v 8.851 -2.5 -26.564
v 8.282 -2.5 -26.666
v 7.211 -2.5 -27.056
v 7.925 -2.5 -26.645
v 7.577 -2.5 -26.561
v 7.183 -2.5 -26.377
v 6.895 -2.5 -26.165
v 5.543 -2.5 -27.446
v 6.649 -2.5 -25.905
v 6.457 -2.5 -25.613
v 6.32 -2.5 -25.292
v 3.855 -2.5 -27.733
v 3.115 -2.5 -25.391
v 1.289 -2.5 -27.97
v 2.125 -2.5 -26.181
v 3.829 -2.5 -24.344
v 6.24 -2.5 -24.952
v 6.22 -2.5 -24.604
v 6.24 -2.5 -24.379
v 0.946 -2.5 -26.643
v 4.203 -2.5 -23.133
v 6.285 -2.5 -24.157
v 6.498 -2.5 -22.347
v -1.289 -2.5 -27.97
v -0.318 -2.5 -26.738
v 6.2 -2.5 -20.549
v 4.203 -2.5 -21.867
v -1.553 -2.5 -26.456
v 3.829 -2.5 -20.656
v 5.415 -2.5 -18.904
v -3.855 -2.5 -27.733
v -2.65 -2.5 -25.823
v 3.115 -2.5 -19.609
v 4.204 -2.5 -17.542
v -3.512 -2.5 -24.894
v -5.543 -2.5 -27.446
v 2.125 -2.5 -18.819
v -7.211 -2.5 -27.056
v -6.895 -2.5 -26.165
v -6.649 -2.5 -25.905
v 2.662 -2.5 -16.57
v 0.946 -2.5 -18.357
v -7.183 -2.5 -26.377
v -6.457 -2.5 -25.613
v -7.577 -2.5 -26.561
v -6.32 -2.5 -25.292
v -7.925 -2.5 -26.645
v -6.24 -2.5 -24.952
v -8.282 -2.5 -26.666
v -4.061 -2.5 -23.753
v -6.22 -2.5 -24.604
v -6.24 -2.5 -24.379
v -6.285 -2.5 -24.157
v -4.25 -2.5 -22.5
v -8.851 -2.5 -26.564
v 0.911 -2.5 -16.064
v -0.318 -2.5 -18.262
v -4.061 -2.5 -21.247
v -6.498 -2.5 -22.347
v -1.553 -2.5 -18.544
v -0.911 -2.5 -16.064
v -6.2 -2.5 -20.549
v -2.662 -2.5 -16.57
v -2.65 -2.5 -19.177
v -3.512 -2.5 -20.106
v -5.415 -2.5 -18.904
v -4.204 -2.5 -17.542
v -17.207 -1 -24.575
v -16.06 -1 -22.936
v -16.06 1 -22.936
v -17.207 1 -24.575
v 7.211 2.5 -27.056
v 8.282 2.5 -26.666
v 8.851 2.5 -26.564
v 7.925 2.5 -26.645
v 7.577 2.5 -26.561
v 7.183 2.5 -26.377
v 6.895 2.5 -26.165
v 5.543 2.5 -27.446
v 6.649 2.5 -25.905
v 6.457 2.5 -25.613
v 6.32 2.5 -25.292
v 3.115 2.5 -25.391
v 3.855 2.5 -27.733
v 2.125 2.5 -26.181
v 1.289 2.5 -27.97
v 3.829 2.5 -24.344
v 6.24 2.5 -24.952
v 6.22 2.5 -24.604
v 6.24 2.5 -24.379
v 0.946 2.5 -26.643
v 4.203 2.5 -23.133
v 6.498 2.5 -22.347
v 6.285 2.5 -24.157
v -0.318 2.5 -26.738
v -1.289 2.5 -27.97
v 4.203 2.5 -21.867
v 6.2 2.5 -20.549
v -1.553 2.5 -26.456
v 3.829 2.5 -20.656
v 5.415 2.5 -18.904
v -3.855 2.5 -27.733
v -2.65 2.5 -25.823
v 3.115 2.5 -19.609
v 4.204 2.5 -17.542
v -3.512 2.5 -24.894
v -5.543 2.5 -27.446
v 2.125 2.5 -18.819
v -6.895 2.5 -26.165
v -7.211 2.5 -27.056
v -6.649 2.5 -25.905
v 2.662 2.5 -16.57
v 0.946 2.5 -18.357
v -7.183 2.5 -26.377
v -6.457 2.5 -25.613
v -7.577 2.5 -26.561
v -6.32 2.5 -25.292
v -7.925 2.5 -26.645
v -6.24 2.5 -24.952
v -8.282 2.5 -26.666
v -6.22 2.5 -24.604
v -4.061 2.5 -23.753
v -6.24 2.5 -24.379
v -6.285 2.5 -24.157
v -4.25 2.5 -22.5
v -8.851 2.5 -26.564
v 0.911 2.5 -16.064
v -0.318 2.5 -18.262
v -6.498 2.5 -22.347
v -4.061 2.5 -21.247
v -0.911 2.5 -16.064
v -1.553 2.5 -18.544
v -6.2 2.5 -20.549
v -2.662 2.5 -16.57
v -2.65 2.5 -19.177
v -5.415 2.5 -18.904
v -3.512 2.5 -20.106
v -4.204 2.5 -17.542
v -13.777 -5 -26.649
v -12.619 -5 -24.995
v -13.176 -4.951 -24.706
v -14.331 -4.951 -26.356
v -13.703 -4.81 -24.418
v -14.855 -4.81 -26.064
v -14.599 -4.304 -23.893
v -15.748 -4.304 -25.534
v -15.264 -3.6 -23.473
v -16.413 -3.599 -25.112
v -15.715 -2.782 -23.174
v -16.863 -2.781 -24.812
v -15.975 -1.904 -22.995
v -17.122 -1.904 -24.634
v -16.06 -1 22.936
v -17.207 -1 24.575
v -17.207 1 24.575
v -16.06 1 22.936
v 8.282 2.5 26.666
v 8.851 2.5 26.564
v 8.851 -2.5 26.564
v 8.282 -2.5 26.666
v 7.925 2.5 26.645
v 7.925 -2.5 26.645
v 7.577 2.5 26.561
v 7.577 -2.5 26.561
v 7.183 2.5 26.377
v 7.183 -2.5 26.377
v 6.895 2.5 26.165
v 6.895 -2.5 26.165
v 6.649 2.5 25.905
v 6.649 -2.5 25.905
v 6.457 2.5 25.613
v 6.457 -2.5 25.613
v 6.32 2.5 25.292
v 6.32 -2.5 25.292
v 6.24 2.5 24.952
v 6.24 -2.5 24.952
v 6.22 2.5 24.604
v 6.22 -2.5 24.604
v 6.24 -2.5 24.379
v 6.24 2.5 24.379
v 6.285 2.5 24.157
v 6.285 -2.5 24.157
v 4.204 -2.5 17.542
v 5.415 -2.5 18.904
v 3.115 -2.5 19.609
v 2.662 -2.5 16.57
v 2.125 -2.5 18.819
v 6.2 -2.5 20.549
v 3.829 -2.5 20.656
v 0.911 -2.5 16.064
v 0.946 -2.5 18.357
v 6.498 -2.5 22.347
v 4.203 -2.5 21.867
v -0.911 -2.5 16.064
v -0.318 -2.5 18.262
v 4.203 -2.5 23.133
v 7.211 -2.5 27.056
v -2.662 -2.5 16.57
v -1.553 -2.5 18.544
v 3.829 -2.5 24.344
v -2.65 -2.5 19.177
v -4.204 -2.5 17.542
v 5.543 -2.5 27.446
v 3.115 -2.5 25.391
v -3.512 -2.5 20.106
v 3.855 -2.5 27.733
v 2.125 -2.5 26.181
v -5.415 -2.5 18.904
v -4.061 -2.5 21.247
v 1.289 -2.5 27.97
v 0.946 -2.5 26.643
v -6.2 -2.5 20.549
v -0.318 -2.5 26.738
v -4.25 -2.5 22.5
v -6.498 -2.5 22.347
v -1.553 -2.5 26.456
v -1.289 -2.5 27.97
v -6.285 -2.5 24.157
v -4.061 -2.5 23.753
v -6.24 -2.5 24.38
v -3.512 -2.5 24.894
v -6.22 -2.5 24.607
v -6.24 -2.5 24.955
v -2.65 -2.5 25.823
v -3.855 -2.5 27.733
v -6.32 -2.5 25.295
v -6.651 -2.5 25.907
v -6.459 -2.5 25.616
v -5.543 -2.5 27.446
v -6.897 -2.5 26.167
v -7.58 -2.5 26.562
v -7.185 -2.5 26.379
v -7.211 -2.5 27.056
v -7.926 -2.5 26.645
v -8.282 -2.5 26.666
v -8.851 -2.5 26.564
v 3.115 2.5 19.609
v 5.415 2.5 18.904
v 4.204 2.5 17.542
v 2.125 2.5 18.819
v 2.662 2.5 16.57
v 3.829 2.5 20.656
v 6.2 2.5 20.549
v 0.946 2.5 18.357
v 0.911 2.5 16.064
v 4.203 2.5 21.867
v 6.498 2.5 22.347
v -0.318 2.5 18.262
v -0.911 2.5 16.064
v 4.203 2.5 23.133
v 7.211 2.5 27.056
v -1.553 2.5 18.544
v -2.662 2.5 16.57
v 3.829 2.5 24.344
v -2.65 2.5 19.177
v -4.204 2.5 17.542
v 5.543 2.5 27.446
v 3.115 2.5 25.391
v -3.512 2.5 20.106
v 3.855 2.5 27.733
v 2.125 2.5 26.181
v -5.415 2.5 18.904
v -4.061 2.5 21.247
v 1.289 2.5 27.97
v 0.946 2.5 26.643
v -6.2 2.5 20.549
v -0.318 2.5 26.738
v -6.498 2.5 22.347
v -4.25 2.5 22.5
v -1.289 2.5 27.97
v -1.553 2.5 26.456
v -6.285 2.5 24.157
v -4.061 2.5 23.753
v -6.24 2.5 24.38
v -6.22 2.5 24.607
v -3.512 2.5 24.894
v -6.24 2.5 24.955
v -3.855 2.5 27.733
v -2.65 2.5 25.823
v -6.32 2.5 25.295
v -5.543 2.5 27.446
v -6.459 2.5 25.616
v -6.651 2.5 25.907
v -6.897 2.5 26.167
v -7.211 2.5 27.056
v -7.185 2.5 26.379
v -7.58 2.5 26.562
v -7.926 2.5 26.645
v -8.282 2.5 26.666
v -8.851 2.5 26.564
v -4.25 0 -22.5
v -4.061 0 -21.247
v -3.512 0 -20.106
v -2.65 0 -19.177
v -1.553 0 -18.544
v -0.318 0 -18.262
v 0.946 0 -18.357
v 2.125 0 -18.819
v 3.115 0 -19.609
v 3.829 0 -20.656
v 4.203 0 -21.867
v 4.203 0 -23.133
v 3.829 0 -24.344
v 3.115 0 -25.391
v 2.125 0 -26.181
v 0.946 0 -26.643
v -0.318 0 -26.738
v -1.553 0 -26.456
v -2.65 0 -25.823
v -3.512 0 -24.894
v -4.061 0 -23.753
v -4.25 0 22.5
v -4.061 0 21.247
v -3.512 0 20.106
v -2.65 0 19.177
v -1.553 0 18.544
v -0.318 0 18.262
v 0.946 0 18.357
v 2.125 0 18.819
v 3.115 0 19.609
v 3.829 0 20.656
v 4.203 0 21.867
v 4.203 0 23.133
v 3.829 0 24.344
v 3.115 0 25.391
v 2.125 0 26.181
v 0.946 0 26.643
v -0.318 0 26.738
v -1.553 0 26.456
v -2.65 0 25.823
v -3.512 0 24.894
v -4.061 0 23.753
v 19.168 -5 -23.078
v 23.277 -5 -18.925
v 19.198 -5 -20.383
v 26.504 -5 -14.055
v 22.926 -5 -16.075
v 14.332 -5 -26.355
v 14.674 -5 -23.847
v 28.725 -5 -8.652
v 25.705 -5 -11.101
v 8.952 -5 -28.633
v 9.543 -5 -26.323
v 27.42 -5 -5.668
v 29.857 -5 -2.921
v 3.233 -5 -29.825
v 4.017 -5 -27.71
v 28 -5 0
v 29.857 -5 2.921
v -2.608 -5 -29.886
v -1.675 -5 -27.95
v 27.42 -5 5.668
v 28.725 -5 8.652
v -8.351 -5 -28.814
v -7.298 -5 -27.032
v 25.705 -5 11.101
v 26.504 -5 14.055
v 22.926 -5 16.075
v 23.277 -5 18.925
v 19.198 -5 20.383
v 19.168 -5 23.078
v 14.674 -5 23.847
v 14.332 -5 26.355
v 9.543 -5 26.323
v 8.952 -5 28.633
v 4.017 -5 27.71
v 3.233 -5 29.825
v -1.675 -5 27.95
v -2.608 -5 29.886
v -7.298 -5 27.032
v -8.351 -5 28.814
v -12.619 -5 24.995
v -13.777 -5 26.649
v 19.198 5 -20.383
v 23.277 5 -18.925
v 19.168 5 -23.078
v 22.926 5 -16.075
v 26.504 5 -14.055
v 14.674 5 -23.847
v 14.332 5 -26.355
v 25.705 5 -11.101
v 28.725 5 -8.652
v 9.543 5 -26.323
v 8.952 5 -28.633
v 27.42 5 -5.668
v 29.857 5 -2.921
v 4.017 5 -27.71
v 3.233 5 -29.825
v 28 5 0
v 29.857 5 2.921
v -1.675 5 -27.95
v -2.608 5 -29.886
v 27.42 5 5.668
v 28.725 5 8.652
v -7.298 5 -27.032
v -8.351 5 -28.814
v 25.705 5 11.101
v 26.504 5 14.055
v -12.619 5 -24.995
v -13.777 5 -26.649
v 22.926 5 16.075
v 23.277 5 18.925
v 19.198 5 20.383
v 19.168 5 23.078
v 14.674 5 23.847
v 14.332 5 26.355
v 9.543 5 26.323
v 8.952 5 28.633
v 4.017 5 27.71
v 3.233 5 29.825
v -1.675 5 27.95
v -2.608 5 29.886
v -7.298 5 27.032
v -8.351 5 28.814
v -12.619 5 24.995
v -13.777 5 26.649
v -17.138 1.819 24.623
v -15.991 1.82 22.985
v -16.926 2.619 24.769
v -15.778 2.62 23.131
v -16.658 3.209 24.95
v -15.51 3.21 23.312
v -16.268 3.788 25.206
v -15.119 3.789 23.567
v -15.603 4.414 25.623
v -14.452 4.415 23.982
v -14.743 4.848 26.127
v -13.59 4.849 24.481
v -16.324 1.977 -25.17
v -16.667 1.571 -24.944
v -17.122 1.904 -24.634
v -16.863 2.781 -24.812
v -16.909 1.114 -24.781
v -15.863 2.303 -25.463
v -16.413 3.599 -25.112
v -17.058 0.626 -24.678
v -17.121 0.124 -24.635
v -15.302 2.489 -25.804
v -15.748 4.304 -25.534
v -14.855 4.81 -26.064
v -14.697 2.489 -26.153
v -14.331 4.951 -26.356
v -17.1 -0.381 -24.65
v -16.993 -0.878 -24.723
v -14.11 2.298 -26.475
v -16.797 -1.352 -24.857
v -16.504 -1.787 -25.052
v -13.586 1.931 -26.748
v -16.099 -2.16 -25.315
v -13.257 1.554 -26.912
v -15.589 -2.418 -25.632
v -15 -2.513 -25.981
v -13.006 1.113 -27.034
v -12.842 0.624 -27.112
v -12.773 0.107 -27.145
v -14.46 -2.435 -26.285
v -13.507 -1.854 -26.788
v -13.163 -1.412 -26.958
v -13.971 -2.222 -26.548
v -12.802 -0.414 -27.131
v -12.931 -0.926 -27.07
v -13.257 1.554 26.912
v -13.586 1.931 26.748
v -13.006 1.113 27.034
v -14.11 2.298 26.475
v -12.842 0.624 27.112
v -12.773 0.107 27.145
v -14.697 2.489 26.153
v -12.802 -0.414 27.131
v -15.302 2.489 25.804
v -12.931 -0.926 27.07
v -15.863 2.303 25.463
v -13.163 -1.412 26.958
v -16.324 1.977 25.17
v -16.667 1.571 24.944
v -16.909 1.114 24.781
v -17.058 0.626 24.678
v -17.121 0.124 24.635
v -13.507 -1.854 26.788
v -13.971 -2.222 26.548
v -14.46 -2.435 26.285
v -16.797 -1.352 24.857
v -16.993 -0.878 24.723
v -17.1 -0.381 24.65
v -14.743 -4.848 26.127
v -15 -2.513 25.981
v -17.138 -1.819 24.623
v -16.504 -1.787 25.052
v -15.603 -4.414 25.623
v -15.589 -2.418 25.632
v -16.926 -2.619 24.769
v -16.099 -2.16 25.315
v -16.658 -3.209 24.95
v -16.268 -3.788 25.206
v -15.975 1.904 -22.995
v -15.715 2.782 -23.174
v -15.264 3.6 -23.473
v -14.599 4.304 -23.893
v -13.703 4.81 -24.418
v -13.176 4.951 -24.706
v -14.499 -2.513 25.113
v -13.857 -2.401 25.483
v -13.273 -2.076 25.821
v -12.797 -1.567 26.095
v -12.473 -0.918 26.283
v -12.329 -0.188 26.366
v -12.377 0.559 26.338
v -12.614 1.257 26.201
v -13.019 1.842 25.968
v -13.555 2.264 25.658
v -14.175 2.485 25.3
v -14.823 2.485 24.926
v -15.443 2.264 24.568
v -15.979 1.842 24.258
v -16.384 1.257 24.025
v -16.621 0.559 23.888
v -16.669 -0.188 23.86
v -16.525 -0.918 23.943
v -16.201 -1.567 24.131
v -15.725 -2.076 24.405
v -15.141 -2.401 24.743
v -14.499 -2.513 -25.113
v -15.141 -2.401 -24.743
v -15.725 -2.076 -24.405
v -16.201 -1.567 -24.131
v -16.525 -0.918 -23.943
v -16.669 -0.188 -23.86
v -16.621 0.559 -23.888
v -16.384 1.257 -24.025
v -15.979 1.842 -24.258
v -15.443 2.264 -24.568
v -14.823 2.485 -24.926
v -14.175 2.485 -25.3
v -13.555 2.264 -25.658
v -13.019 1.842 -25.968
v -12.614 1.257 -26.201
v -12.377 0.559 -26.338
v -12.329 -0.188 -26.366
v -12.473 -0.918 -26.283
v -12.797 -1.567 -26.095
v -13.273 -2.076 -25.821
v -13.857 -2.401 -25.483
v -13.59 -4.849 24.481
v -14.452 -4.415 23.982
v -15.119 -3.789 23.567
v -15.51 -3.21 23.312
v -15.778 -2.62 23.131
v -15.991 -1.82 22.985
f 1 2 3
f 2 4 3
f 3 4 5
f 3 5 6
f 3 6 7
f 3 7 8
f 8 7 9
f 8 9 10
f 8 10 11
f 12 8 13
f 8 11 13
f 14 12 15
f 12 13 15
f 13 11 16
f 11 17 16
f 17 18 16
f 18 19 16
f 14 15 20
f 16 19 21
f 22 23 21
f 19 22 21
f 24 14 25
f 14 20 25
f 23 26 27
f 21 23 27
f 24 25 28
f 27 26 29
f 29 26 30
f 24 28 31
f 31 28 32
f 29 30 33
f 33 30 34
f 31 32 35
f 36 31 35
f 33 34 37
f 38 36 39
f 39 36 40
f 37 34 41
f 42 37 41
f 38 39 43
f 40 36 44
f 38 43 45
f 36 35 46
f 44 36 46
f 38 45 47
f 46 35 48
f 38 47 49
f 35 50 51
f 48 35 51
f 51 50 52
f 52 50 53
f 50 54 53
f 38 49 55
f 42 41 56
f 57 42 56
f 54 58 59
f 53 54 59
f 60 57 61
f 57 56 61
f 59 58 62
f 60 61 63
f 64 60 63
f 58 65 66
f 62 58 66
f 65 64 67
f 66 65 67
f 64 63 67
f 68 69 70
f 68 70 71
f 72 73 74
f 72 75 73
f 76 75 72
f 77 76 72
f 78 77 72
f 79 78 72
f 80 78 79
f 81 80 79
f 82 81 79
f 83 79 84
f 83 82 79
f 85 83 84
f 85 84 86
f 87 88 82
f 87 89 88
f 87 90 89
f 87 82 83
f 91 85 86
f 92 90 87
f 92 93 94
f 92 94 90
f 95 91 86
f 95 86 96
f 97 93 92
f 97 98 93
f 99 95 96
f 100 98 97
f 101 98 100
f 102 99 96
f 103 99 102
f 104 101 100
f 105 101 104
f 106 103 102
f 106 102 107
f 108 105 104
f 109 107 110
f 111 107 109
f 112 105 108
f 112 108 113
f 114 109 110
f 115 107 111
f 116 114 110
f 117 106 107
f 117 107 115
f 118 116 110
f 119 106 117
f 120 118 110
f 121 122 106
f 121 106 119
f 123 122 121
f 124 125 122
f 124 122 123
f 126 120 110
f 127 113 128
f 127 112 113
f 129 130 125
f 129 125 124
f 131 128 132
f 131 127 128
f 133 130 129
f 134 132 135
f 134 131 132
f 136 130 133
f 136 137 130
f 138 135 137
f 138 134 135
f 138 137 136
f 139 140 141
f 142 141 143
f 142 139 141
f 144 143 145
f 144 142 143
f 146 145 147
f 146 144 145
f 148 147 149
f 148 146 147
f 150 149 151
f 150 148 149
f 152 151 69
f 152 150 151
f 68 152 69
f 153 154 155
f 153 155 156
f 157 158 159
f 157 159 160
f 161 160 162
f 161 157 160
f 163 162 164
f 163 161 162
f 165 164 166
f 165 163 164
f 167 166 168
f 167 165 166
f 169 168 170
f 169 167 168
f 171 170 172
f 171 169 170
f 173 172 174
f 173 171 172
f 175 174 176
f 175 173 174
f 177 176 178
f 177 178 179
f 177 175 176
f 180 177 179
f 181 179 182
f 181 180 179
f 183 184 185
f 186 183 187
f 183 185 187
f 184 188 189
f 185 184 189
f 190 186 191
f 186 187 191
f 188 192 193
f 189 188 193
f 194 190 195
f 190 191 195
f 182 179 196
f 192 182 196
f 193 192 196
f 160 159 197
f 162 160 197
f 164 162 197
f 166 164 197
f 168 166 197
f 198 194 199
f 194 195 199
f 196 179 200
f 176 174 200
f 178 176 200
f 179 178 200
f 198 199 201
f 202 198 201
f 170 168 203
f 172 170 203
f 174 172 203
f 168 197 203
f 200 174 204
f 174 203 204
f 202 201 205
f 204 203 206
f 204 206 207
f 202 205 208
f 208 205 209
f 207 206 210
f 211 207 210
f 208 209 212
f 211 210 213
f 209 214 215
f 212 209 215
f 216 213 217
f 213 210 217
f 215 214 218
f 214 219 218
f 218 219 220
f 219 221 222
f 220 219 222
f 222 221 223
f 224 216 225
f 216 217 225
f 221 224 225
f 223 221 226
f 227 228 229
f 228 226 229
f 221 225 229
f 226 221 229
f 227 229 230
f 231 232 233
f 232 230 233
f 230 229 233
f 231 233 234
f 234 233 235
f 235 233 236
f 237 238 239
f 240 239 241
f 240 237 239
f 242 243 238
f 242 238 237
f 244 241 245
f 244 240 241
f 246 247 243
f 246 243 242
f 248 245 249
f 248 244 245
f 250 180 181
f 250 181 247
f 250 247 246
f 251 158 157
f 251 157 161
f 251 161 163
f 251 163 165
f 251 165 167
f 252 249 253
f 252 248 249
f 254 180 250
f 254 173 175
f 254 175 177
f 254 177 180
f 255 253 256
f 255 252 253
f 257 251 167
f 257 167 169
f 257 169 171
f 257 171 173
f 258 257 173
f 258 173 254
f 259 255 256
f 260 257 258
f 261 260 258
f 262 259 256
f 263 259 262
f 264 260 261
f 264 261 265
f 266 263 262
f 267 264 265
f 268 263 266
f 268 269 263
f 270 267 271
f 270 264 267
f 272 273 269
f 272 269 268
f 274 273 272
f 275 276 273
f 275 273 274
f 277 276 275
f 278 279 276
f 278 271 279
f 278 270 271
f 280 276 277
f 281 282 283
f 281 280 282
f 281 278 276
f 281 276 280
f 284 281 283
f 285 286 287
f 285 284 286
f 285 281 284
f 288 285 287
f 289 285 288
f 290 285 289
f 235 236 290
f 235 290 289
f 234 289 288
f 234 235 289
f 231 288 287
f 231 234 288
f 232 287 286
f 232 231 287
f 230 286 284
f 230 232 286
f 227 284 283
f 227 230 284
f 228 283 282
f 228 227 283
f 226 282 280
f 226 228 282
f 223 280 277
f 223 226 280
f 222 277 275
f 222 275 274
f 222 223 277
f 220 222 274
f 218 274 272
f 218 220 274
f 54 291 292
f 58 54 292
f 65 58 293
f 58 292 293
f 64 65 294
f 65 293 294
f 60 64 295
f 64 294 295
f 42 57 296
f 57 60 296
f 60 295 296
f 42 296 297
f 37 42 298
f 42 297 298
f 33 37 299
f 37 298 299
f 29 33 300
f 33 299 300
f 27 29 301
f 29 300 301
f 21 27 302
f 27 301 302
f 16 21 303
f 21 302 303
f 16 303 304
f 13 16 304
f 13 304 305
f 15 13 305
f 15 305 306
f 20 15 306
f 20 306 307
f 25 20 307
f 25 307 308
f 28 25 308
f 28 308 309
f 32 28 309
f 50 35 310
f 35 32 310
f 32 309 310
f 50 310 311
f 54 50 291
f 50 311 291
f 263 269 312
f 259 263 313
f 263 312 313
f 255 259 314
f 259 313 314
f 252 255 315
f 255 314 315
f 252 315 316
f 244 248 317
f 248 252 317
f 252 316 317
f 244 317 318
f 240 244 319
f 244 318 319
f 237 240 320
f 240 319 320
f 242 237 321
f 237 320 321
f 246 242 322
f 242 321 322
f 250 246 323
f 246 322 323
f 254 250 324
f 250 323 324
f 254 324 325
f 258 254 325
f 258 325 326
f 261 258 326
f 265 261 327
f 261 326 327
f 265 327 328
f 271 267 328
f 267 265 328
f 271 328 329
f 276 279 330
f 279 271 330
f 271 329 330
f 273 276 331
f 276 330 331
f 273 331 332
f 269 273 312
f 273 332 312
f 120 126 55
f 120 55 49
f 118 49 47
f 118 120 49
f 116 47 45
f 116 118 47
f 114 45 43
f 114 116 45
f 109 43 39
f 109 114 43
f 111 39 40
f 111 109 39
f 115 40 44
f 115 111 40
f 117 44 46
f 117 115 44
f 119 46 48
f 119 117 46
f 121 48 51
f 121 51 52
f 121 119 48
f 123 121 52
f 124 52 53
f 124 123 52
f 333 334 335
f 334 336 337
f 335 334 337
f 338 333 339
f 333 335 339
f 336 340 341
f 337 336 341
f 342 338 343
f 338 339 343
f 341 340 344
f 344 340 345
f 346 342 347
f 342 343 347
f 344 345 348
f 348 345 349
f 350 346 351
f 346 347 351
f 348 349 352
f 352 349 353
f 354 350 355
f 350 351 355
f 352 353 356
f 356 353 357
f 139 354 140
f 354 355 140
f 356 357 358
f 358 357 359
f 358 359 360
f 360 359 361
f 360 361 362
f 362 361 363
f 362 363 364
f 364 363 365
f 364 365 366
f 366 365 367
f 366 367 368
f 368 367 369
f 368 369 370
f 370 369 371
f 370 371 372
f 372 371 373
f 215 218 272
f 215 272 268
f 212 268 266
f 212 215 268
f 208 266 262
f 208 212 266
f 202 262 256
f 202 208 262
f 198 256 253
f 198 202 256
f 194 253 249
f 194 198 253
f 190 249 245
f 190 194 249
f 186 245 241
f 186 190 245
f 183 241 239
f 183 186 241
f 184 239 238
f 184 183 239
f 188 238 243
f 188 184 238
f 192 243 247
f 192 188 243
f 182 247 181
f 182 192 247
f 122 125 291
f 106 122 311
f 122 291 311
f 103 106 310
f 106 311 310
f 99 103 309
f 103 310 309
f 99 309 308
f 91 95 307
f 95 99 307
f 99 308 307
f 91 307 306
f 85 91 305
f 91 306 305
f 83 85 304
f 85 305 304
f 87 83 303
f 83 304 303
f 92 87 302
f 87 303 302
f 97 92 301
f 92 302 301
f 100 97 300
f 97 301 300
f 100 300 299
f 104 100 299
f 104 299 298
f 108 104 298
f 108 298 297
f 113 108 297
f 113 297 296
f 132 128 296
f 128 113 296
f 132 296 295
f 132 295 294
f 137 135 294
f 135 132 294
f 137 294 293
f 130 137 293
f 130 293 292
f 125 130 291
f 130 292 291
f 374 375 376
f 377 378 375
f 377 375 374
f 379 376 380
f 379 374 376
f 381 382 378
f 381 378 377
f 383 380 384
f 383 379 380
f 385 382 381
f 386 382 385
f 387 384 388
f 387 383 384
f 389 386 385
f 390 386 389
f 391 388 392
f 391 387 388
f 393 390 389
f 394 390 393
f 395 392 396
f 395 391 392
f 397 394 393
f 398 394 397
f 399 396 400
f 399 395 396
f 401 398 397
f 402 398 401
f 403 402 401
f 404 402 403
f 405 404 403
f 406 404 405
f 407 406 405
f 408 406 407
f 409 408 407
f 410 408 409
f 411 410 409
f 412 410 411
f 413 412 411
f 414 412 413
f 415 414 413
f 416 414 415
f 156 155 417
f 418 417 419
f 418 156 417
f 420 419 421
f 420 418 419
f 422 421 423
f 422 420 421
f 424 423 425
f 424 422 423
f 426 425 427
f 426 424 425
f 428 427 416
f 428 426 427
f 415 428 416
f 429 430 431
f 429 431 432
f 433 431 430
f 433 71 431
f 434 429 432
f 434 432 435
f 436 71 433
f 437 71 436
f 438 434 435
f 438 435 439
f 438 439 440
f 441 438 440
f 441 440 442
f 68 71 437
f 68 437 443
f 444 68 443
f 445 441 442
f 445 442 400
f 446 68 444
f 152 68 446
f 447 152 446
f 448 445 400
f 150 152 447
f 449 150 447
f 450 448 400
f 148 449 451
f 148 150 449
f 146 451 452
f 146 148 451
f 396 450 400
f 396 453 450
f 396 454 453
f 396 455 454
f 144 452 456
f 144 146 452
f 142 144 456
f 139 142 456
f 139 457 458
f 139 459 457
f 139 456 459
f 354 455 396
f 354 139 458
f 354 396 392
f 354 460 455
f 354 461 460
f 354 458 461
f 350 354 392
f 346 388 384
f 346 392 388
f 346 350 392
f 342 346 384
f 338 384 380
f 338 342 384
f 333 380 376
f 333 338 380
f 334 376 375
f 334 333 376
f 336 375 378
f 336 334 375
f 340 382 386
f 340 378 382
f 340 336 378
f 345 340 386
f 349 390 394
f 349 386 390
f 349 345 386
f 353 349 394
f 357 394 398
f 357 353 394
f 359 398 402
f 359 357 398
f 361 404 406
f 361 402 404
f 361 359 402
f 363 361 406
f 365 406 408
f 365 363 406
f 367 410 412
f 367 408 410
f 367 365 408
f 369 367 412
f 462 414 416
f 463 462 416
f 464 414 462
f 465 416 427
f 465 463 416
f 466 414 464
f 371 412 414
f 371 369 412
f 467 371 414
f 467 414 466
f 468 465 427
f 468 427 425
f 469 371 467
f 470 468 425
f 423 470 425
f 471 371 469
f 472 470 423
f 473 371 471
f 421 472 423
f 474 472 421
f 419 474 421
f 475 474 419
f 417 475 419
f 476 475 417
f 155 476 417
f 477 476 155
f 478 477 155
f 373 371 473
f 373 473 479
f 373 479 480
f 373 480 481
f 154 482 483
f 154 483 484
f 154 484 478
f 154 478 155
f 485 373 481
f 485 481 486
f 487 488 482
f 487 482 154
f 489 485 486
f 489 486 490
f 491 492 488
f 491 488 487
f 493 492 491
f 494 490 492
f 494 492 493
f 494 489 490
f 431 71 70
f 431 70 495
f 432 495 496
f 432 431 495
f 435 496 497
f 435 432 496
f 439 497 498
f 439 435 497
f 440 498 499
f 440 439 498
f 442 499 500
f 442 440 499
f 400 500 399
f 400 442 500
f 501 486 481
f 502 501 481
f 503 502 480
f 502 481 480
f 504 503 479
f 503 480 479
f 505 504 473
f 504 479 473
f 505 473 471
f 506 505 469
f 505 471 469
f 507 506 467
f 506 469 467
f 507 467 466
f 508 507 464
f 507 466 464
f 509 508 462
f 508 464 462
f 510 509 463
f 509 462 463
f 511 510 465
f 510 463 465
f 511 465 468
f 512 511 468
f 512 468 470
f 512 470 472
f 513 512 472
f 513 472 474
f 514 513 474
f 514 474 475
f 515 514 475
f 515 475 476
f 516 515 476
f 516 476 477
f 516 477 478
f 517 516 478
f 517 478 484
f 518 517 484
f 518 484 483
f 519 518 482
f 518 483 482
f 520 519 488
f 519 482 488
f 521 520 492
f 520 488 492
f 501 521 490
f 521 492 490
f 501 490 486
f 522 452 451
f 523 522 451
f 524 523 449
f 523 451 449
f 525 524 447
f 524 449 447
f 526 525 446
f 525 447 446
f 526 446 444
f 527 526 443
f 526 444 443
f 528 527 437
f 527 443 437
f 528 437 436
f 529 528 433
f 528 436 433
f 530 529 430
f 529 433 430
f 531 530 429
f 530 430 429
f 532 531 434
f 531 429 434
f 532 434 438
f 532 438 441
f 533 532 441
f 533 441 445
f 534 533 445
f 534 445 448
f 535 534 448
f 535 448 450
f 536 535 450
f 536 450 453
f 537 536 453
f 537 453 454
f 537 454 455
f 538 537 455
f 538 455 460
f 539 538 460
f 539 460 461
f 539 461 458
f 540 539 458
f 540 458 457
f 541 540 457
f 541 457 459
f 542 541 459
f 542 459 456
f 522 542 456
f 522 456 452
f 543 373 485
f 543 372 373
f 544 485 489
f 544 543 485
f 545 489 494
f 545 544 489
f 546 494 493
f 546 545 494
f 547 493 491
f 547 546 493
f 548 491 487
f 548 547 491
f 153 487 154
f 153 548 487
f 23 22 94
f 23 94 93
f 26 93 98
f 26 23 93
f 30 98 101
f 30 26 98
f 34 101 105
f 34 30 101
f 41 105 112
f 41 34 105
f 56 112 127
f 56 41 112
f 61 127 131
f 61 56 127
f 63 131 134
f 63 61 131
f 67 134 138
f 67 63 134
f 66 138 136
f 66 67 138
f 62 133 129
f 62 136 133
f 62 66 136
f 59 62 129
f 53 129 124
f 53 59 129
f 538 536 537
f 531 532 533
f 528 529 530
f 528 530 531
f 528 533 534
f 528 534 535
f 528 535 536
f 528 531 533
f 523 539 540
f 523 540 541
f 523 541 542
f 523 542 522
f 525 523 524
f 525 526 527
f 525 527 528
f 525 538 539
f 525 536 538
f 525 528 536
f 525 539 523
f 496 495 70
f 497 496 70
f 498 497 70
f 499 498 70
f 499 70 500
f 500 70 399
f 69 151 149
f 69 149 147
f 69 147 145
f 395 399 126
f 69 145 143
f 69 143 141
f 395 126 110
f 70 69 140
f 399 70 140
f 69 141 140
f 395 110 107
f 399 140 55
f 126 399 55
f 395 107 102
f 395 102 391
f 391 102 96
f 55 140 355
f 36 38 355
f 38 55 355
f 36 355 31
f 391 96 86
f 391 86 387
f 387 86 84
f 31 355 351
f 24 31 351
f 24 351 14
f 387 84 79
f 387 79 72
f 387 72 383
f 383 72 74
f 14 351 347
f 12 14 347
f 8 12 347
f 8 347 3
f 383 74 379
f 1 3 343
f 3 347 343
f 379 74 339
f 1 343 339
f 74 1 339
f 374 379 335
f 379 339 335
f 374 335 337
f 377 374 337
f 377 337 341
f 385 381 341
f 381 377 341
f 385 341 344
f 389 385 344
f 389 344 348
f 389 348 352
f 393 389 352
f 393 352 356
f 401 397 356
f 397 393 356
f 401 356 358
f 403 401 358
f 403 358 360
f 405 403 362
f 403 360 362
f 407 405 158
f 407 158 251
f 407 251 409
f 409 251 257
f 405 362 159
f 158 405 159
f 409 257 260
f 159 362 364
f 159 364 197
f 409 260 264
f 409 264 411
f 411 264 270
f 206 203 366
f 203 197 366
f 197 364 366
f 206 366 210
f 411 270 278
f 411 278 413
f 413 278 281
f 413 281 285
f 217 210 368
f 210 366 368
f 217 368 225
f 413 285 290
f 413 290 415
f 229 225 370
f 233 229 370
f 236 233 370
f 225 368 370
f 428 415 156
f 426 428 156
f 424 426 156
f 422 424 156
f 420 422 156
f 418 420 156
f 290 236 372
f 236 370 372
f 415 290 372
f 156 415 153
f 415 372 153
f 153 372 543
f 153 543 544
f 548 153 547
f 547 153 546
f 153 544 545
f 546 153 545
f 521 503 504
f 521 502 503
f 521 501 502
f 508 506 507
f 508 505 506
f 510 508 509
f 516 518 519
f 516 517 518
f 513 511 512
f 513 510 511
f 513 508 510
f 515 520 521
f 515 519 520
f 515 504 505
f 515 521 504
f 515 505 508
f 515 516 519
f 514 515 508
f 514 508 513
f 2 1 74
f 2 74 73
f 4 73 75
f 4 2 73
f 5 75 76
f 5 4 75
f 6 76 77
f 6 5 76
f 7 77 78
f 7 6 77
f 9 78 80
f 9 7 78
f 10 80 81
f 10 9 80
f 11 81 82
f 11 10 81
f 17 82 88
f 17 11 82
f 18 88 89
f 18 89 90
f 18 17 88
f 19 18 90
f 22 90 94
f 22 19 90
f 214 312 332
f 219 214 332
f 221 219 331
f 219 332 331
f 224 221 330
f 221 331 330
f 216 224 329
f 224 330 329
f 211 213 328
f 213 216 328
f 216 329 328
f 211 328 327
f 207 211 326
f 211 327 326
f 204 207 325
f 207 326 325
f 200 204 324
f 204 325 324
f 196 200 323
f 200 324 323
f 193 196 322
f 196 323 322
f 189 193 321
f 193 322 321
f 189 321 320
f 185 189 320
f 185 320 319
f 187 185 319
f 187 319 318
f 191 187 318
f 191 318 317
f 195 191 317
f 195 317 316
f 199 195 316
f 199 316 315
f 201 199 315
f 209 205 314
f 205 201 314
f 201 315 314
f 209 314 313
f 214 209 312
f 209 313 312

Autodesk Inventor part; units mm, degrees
ref_plane "YZ Plane" through (0, 0, 0) normal (1, 0, 0) x (0, 1, 0)
ref_plane "XZ Plane" through (0, 0, 0) normal (0, 1, 0) x (-1, 0, 0)
ref_plane "XY Plane" through (0, 0, 0) normal (0, 0, 1) x (1, 0, 0)
sketch "Skizze1" plane through (0, 0, 0) normal (0, 1, 0) x (-1, 0, 0)
  circle A0 centre (0, 0) radius 28
  circle A1 centre (0, 0) radius 30
  dimension "d0" = 56
  dimension "d1" = 60
extrude "Extrusion1" add sketch "Skizze1" along normal mid plane 10
sketch "Skizze2" plane through (0, 0, 0) normal (0, 1, 0) x (-1, 0, 0)
  circle A0 centre (0, 22.5) radius 4.25
  circle A1 centre (0, -22.5) radius 4.25
  line L0 (44.9262, 0) -> (-43.1306, 0) construction
  circle A2 centre (0, -22.5) radius 6.5
  circle A3 centre (0, 22.5) radius 6.5
  line L1 (0, 38.6377) -> (0, -60.2779) construction
  line L2 (3, 29.5) -> (-3, 29.5)
  line L3 (-3, 29.5) -> (-3, -29.5)
  line L4 (-3, -29.5) -> (3, -29.5)
  line L5 (3, -29.5) -> (3, 29.5)
  point P0 (0, 0)
  point P1 (-3, 28.2663)
  point P2 (3, 28.2663)
  point P3 (-3, -28.2663)
  point P4 (3, -28.2663)
  dimension "d4" = 45
  dimension "d5" = 8.5
  dimension "d6" = 8.5
  dimension "d7" = 13
  dimension "d8" = 13
  dimension "d9" = 6
  dimension "d21" = 59
extrude "Extrusion2" add sketch "Skizze2" along normal mid plane 5 contours A0 L5 A3 | A0 L3 A3 L5 | L5 A3 L3 A0 | A0 L3 A3 | A3 L3 L2 L5 | L5 A1 L3 A2 | A2 L5 A1 | L3 A1 A2 | L3 A1 L5 A2 | A2 L5 L4 L3
sketch "Skizze3" plane through (0, 0, 0) normal (0, 1, 0) x (-1, 0, 0)
  line L0 (-37.328, 53.3099) -> (47.5678, -67.9338) construction
  line L1 (48.5469, 69.3321) -> (-29.5635, -42.2211) construction
  line L2 (0, 56.0595) -> (0, -79.5026) construction
  circle A0 centre (0, 0) radius 30
  circle A1 centre (0, 0) radius 28
  line L3 (19.8236, 28.311) -> (13.732, 19.6114)
  line L4 (14.4871, -20.6897) -> (22.3283, -31.8882)
  point P0 (16.0601, -22.9363)
  point P1 (17.2073, -24.5746)
  point P2 (17.2073, 24.5746)
  point P3 (16.0601, 22.9363)
  dimension "d12" = 110
  dimension "d13" = 35
  dimension "d19" = 56
  dimension "d20" = 60
extrude "Extrusion3" cut sketch "Skizze3" along normal mid plane 10 contours A0 L4 A1 L3 picked at (29.0468, 2.3769)
sketch "Skizze4" plane through (0, 0, 0) normal (0, 1, 0) x (-1, 0, 0)
  line L0 (-8.0451, 13.9345) -> (38.1422, -66.0642) construction
  line L1 (17.2073, -24.5746) -> (16.0601, -22.9363) construction
  line L2 (0, 9.2259) -> (0, -51.7672) construction
  arc A0 (17.2073, 24.5746) -> (17.2073, -24.5746) centre (0, 0) ccw projected
  point P0 (16.6337, -23.7554)
  point P1 (15, -25.9808)
  point P2 (15, -25.9808)
  point P3 (19.2393, -22.9285)
  dimension "d16" = 30
ref_plane "Arbeitsebene3" through (-15.5, 0, -26.8468) normal (-0.4226, 0, -0.9063) x (0, -1, 0)
sketch "Skizze5" plane through (-15.5, 0, -26.8468) normal (-0.4226, 0, -0.9063) x (0, -1, 0)
  point P0 (0, -2.7018)
ref_plane "Arbeitsebene4" through (-15, 0, -25.9808) normal (-0.5, 0, -0.866) x (0, -1, 0)
sketch "Skizze6" plane through (-15, 0, -25.9808) normal (-0.5, 0, -0.866) x (0, -1, 0)
  circle A0 centre (0, 0) radius 2.5131
  point P0 (0, 0)
extrude "Extrusion5" cut sketch "Skizze6" against normal blind 1
mirror "Spiegeln2" about plane through (0, 0, 0) normal (0, 0, 1) of "Extrusion5"
fillet "Rundung1" radius 4 4 edges at (-16.6337, -5, -23.7554) (-16.6337, 5, -23.7554) (-16.6337, 5, 23.7554) (-16.6337, -5, 23.7554)
fillet "Rundung2" radius 2 4 edges at (3.8552, 0, -27.7333) (-3.8552, 0, -27.7333) (-3.8552, 0, 27.7333) (3.8552, 0, 27.7333)
ref_plane "Arbeitsebene5" through (0, 0, 0) normal (0, 0, 1) x (1, 0, 0)
properties part number "_3D-Druck"
